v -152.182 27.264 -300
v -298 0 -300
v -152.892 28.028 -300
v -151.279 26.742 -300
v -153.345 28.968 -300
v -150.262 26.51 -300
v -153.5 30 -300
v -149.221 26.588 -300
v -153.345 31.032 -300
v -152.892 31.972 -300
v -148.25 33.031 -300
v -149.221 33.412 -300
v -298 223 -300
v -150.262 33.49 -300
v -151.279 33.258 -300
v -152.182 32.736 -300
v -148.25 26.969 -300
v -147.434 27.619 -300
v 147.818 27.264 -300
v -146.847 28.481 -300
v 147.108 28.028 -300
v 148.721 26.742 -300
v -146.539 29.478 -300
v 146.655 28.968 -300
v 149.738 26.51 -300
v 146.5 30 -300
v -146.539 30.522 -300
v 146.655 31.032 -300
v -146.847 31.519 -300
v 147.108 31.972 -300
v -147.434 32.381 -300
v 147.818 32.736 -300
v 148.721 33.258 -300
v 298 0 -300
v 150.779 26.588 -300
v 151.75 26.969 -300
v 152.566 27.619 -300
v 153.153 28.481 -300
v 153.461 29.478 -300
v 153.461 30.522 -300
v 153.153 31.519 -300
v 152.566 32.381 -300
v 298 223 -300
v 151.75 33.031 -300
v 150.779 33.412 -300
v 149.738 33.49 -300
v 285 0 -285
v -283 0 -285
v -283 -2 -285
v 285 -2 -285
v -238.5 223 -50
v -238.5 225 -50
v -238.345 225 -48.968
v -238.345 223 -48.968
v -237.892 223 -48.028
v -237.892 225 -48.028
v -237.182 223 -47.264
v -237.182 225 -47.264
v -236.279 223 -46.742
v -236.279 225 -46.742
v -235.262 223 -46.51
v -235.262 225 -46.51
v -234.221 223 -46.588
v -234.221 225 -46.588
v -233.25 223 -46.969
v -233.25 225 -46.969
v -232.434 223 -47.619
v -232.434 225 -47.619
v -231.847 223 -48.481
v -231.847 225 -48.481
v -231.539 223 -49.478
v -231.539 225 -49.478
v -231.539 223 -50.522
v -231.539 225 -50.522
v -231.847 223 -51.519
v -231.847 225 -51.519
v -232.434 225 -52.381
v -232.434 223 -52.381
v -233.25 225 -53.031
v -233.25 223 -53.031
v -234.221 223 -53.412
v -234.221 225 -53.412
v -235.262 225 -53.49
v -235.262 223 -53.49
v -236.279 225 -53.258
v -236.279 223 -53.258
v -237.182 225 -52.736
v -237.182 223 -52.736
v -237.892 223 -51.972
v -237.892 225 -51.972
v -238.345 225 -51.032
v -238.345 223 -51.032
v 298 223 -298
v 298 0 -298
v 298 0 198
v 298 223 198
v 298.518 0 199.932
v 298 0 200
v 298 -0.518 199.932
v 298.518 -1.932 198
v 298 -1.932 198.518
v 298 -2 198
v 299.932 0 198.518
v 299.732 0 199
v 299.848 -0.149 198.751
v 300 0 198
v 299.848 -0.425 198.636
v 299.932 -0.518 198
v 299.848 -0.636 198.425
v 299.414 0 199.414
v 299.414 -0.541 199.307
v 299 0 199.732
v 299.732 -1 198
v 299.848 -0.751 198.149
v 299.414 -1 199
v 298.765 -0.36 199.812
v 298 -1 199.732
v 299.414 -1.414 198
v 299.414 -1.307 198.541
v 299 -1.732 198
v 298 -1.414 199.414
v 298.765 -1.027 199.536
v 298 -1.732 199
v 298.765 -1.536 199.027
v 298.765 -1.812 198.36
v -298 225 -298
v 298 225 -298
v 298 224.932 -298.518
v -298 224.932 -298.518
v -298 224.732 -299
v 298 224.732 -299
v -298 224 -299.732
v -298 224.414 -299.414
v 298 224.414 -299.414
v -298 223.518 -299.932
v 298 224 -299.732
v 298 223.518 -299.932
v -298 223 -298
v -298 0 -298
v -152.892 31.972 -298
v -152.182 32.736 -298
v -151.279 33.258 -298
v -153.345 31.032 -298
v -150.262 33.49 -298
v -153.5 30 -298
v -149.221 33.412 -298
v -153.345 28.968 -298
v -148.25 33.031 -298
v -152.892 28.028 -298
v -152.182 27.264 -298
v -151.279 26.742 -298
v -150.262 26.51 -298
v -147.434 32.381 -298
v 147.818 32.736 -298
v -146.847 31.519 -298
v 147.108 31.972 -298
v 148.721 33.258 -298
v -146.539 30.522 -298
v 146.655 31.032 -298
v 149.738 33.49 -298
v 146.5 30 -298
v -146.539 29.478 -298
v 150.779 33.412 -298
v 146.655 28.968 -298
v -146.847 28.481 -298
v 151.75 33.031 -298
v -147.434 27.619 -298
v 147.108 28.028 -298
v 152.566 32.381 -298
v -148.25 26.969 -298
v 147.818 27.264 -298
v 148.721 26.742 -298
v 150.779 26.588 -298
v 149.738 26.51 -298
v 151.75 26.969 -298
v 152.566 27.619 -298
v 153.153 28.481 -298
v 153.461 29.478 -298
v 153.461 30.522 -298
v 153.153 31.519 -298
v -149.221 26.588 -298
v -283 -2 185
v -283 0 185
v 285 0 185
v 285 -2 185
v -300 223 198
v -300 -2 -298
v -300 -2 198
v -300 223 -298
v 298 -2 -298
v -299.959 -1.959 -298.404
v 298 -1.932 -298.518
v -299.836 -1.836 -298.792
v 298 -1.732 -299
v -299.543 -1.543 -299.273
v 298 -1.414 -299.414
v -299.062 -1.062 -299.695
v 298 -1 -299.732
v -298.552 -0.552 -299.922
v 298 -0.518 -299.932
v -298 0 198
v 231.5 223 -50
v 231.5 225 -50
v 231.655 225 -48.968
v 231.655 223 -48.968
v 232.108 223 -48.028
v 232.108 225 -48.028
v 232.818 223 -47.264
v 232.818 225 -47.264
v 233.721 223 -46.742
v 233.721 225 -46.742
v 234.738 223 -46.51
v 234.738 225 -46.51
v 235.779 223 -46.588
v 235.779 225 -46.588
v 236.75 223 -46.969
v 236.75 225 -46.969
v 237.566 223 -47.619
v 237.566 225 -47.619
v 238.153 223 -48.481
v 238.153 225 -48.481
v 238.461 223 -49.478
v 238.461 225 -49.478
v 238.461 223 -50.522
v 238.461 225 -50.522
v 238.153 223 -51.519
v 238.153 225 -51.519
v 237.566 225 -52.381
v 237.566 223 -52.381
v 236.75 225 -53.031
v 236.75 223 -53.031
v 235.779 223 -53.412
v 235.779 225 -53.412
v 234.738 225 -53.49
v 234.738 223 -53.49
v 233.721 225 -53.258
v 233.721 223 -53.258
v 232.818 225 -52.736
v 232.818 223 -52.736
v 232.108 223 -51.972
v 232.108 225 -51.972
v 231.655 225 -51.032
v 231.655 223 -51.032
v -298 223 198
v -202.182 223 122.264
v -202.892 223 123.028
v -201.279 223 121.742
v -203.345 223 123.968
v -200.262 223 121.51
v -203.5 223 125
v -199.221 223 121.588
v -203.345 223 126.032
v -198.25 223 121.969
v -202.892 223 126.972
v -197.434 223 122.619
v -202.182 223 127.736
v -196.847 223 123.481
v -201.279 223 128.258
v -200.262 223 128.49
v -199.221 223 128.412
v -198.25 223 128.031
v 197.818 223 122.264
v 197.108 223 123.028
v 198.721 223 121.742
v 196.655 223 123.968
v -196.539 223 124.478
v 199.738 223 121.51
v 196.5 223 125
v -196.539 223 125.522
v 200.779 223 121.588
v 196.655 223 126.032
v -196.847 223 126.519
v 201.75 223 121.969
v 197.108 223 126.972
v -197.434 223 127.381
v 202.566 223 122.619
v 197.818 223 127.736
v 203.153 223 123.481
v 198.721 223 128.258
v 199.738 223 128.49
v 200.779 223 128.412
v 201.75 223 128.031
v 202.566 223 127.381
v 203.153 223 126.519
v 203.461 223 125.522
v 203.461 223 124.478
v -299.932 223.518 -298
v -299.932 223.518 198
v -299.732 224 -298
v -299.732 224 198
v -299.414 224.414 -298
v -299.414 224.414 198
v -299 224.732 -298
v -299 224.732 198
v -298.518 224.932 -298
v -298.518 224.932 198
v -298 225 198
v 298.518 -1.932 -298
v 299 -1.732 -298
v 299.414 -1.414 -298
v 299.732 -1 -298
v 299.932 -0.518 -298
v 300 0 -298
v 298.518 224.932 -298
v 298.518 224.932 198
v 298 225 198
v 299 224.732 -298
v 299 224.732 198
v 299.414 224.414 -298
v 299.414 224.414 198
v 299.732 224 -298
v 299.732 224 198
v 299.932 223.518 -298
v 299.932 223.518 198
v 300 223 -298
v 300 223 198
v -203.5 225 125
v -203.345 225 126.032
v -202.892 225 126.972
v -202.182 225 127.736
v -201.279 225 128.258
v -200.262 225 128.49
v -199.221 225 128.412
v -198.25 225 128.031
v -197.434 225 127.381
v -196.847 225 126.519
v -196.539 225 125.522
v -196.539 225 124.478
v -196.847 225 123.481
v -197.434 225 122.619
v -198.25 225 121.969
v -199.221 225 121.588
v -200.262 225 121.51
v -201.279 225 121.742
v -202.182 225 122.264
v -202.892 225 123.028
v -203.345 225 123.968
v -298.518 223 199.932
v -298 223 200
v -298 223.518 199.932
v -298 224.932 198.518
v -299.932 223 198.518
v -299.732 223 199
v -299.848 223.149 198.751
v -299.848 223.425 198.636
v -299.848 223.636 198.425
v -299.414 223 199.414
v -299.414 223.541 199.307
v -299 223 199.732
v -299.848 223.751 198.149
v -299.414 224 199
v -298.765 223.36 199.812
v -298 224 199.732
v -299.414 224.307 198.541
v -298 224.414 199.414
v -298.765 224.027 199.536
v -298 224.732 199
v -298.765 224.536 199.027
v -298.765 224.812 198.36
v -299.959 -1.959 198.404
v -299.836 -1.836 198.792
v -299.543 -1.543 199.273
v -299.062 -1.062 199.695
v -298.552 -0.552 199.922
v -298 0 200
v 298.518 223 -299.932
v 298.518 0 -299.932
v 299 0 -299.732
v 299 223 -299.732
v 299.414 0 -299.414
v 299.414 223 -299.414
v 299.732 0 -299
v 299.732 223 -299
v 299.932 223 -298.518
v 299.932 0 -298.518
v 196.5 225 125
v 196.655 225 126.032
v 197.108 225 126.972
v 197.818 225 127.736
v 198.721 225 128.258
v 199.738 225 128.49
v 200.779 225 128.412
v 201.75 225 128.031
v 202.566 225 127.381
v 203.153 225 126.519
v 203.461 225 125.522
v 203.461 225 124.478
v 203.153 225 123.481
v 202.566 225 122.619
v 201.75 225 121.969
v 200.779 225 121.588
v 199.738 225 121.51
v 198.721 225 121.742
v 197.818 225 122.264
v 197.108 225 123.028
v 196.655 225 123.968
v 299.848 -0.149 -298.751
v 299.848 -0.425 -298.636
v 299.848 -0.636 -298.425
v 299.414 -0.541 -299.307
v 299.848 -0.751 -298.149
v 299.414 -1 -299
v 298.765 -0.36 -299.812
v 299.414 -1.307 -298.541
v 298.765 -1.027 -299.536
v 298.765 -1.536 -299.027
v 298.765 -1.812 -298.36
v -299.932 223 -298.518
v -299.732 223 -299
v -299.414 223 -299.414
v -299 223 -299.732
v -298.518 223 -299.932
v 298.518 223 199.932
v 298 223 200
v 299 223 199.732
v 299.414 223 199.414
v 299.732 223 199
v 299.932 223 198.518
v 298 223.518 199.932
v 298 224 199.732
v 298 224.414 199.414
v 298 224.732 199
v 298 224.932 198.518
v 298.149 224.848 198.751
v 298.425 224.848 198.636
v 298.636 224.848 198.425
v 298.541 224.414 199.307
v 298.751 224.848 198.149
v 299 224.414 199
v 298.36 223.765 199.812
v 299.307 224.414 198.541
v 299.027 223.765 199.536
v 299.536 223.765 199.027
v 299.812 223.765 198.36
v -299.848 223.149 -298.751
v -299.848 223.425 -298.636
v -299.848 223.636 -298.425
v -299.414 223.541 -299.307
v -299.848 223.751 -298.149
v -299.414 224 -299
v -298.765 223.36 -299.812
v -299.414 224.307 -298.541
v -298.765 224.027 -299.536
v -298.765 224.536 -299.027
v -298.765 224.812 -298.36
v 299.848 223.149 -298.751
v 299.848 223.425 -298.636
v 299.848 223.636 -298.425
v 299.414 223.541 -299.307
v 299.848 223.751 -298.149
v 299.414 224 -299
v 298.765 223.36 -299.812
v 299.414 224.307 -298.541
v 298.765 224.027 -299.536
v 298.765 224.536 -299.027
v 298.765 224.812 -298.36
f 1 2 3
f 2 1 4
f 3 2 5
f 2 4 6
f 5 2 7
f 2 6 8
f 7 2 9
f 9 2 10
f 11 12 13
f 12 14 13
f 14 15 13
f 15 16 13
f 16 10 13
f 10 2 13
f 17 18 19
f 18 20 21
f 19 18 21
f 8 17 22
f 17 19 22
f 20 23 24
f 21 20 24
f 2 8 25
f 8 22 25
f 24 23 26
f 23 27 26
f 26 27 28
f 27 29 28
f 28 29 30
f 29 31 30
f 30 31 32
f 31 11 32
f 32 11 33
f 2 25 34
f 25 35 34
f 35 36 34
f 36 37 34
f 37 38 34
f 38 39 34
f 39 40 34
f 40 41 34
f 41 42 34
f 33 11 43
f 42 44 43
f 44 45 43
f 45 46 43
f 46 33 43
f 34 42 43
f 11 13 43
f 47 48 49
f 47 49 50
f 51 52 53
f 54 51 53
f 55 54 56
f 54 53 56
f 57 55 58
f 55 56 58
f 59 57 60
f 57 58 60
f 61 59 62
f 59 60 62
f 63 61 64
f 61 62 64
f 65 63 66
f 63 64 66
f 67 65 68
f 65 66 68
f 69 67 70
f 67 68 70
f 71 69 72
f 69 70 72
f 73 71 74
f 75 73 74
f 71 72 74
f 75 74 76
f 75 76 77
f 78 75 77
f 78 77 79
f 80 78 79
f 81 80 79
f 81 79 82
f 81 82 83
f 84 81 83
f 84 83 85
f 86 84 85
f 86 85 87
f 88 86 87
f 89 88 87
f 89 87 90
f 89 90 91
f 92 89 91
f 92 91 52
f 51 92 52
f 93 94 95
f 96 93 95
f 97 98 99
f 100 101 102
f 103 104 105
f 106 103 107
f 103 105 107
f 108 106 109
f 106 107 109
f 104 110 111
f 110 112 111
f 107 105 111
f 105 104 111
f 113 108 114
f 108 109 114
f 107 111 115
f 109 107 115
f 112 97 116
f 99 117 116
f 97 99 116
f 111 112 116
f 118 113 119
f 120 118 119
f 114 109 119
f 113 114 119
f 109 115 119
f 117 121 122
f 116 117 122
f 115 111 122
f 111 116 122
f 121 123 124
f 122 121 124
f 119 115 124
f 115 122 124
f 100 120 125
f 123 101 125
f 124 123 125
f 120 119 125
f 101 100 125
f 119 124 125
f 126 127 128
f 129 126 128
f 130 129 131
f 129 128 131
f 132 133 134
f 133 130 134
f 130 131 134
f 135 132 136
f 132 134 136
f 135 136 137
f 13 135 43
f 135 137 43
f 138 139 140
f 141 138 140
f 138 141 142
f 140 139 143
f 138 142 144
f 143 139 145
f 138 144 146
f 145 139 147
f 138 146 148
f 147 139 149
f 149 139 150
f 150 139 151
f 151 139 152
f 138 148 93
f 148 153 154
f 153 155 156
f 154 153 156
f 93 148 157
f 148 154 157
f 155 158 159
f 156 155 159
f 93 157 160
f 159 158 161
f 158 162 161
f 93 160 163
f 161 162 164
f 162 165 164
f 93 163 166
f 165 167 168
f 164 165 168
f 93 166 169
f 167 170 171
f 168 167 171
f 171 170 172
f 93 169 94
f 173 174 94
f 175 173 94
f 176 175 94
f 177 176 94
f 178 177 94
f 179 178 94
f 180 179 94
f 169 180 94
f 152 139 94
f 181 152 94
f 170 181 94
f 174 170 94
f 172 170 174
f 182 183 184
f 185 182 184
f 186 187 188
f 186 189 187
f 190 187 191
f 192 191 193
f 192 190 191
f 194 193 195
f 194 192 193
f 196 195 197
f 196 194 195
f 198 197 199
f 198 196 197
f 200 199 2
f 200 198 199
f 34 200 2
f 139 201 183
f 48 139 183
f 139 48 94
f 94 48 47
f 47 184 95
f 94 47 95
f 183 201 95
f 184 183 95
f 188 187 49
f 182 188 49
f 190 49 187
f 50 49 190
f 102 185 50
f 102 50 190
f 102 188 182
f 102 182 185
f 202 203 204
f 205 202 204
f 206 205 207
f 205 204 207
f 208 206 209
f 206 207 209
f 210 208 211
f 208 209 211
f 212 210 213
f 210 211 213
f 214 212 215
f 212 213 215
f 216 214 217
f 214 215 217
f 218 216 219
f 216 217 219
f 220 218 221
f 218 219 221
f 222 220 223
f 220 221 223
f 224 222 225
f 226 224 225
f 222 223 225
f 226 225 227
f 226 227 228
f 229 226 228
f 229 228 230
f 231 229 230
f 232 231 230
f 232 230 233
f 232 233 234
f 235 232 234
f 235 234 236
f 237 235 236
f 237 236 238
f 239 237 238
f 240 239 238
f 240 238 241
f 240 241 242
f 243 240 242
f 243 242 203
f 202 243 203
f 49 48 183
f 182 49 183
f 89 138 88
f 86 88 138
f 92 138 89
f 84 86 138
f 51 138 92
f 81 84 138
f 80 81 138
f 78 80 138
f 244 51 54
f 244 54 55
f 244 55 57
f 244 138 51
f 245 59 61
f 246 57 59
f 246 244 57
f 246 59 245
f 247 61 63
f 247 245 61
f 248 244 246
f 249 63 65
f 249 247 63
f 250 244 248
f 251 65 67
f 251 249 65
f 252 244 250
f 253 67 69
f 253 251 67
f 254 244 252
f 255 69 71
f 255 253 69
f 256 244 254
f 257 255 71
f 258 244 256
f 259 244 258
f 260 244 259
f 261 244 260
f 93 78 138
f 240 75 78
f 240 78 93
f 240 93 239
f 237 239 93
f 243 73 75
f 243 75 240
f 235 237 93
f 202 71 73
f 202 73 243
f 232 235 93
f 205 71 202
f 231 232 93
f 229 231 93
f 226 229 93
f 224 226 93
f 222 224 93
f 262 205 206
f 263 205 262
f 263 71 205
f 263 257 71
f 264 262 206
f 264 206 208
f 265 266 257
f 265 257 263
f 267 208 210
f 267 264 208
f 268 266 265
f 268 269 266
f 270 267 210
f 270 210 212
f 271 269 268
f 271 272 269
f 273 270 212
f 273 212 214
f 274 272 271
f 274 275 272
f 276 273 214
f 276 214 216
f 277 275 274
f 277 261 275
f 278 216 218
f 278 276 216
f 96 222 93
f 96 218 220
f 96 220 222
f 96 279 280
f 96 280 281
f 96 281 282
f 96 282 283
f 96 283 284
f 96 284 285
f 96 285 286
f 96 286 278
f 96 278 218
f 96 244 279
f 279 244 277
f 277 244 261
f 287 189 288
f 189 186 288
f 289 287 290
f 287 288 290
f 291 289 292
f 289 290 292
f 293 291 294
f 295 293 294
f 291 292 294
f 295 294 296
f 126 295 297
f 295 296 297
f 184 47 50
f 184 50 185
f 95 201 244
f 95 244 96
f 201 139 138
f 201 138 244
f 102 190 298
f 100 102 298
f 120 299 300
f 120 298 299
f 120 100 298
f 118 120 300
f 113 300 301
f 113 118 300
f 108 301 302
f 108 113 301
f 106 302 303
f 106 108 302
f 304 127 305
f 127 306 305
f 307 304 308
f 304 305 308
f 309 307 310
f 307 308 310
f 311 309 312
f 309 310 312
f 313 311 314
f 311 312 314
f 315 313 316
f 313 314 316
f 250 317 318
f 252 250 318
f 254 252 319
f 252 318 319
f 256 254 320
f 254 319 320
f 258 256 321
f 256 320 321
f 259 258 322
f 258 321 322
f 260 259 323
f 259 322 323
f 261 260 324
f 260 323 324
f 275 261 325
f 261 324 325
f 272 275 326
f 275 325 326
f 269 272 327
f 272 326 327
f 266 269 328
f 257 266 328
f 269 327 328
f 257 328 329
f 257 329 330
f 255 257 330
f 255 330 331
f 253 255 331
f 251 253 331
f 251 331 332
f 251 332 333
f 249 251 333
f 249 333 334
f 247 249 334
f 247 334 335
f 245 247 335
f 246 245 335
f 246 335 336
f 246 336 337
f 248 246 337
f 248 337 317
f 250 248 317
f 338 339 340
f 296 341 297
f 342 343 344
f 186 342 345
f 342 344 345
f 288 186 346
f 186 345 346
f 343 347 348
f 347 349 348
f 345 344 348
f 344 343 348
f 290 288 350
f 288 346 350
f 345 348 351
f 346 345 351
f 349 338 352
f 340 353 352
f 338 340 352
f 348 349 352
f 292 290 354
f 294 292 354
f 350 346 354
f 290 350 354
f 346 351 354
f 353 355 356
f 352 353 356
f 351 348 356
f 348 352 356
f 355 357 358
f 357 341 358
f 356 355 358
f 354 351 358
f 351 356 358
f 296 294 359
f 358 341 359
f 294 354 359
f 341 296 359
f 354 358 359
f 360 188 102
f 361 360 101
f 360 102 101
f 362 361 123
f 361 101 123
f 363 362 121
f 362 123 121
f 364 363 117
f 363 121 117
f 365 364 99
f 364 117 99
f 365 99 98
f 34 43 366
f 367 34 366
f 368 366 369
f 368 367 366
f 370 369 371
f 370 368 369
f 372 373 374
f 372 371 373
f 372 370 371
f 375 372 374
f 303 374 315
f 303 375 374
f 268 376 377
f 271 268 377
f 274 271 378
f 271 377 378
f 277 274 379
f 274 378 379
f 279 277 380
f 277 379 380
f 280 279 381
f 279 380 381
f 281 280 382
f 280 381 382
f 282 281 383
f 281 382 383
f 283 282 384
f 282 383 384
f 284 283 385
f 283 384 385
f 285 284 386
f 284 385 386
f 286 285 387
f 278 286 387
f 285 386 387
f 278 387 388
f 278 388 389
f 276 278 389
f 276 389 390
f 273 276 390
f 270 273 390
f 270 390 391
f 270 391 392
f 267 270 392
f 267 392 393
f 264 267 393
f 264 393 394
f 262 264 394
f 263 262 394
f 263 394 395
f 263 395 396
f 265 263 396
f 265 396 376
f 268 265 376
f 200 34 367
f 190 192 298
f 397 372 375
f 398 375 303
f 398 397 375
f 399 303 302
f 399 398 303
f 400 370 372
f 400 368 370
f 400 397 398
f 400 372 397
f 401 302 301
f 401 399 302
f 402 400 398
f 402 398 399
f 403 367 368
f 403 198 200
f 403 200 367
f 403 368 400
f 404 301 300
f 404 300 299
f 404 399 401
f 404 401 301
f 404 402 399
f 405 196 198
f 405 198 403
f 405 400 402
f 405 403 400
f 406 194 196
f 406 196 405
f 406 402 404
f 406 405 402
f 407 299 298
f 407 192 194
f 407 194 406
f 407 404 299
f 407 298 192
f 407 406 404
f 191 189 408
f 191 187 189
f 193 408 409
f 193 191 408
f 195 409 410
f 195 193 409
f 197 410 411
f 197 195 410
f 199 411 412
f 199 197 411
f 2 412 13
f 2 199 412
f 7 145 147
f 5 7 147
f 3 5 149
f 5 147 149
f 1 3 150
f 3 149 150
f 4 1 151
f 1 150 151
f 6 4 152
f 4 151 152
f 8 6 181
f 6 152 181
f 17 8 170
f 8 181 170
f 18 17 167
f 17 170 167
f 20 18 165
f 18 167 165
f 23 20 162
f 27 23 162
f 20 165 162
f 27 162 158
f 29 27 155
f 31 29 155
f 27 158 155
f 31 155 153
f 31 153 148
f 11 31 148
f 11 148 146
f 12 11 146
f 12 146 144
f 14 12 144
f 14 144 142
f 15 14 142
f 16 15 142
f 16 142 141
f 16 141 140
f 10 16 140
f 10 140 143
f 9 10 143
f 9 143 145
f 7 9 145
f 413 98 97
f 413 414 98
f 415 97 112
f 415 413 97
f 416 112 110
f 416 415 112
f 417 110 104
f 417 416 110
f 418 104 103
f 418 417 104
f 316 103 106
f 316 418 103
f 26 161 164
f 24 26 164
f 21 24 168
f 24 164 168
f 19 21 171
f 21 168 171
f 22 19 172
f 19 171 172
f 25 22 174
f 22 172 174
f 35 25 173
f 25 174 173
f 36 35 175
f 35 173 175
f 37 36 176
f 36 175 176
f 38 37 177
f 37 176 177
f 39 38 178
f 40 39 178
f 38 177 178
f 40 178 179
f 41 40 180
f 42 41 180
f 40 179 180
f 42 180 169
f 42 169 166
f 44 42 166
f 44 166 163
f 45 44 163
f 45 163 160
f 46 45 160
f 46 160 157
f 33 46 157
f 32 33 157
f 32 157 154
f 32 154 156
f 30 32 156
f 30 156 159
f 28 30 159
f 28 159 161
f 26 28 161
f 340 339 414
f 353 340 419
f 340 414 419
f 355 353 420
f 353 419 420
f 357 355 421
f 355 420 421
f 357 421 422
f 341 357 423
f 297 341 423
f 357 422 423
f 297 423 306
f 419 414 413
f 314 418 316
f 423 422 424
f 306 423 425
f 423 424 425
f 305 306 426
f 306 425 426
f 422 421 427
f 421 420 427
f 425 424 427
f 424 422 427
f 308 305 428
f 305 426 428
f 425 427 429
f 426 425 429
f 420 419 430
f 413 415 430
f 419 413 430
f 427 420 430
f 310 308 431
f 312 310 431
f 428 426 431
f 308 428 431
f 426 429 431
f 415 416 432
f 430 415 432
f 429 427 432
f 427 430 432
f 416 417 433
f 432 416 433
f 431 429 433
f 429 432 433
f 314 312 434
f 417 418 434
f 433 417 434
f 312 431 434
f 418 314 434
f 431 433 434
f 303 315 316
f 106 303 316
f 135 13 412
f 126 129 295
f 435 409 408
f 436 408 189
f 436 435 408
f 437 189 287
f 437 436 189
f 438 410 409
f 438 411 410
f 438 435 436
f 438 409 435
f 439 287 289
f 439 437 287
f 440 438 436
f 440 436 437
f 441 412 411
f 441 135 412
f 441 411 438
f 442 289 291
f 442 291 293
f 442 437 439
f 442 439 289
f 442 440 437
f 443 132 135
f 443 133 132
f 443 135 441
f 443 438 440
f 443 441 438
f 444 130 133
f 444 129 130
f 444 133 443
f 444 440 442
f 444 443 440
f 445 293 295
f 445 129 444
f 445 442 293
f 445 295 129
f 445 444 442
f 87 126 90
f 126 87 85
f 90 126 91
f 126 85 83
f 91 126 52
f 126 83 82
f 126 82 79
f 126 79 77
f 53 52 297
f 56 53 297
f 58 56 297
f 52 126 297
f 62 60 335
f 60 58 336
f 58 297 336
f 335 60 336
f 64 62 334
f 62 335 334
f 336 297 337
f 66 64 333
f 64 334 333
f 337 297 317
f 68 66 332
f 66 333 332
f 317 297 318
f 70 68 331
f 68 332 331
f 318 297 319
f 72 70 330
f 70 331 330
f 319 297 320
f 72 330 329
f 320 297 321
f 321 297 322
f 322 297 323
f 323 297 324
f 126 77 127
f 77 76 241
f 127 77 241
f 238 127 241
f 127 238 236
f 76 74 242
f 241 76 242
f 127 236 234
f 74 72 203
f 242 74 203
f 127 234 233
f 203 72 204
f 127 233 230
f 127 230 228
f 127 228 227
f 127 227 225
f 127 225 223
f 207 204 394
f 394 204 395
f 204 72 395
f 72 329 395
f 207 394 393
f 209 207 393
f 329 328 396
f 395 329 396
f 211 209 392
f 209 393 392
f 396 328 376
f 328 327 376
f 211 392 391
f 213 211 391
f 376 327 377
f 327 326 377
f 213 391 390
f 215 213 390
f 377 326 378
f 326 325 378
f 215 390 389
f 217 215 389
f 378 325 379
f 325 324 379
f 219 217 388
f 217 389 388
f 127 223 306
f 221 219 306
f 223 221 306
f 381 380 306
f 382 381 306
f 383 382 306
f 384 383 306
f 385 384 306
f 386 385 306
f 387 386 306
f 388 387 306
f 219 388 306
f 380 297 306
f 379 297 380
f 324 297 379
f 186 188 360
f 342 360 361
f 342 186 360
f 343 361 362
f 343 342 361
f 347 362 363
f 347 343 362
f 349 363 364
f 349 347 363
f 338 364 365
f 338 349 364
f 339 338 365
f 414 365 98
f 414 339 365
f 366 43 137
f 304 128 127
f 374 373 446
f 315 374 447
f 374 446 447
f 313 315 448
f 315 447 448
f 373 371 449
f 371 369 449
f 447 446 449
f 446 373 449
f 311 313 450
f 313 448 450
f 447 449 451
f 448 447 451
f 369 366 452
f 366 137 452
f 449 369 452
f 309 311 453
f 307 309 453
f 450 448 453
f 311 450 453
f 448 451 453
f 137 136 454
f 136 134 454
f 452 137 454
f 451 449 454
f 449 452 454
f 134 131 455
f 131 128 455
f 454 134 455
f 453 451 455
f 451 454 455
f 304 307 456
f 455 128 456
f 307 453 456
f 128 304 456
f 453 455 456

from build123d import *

# Parameters (mm, degrees)
F0_W     = 600
F0_H     = 500
F1_DEPTH = 225
F2_T     = -2
F3_W     = 600
F3_H     = 500
F3_W_2   = 568
F3_H_2   = 470
F4_DEPTH = 2
F6_D     = 7
F8_D     = 7
F8_DEPTH = 18
F9_R     = 2


with BuildPart() as f1:
    # F0 (on Front) → F1 (new body)
    with BuildSketch(Plane.XZ):
        with Locations((0, -50)):
            Rectangle(F0_W, F0_H)
    extrude(amount=-F1_DEPTH)

    # F2
    f2_openings = [f1.faces().sort_by_distance(p)[0] for p in [
        (0, 0, -50),
    ]]
    offset(amount=F2_T, openings=f2_openings)

    # F3 (on Front) → F4 (join)
    with BuildSketch(Plane.XZ):
        with Locations((0, -50)):
            Rectangle(F3_W, F3_H)
        with Locations((1, -50)):
            Rectangle(F3_W_2, F3_H_2, mode=Mode.SUBTRACT)
    extrude(amount=F4_DEPTH)

    # F6 (through all)
    with Locations(Plane.XZ.offset(-223)):
        with Locations((-200, 125), (200, 125), (235, -50), (-235, -50)):
            Hole(F6_D / 2)

    # F8
    with Locations(Plane(origin=(0, 0, -300), x_dir=(1, 0, 0), z_dir=(0, 0, -1))):
        with Locations((150, -30), (-150, -30)):
            Hole(F8_D / 2, depth=F8_DEPTH)

    # F9
    f9_edges = [f1.edges().sort_by_distance(p)[0] for p in [
        (0, -2, 200),
        (300, 111.5, 200),
        (0, 225, 200),
        (-300, 111.5, 200),
        (0, -2, -300),
        (0, 225, -300),
        (-300, 111.5, -300),
        (300, 111.5, -300),
        (300, 225, -50),
        (300, -2, -50),
        (-300, 225, -50),
    ]]
    fillet(f9_edges, radius=F9_R)


solid = f1.part
